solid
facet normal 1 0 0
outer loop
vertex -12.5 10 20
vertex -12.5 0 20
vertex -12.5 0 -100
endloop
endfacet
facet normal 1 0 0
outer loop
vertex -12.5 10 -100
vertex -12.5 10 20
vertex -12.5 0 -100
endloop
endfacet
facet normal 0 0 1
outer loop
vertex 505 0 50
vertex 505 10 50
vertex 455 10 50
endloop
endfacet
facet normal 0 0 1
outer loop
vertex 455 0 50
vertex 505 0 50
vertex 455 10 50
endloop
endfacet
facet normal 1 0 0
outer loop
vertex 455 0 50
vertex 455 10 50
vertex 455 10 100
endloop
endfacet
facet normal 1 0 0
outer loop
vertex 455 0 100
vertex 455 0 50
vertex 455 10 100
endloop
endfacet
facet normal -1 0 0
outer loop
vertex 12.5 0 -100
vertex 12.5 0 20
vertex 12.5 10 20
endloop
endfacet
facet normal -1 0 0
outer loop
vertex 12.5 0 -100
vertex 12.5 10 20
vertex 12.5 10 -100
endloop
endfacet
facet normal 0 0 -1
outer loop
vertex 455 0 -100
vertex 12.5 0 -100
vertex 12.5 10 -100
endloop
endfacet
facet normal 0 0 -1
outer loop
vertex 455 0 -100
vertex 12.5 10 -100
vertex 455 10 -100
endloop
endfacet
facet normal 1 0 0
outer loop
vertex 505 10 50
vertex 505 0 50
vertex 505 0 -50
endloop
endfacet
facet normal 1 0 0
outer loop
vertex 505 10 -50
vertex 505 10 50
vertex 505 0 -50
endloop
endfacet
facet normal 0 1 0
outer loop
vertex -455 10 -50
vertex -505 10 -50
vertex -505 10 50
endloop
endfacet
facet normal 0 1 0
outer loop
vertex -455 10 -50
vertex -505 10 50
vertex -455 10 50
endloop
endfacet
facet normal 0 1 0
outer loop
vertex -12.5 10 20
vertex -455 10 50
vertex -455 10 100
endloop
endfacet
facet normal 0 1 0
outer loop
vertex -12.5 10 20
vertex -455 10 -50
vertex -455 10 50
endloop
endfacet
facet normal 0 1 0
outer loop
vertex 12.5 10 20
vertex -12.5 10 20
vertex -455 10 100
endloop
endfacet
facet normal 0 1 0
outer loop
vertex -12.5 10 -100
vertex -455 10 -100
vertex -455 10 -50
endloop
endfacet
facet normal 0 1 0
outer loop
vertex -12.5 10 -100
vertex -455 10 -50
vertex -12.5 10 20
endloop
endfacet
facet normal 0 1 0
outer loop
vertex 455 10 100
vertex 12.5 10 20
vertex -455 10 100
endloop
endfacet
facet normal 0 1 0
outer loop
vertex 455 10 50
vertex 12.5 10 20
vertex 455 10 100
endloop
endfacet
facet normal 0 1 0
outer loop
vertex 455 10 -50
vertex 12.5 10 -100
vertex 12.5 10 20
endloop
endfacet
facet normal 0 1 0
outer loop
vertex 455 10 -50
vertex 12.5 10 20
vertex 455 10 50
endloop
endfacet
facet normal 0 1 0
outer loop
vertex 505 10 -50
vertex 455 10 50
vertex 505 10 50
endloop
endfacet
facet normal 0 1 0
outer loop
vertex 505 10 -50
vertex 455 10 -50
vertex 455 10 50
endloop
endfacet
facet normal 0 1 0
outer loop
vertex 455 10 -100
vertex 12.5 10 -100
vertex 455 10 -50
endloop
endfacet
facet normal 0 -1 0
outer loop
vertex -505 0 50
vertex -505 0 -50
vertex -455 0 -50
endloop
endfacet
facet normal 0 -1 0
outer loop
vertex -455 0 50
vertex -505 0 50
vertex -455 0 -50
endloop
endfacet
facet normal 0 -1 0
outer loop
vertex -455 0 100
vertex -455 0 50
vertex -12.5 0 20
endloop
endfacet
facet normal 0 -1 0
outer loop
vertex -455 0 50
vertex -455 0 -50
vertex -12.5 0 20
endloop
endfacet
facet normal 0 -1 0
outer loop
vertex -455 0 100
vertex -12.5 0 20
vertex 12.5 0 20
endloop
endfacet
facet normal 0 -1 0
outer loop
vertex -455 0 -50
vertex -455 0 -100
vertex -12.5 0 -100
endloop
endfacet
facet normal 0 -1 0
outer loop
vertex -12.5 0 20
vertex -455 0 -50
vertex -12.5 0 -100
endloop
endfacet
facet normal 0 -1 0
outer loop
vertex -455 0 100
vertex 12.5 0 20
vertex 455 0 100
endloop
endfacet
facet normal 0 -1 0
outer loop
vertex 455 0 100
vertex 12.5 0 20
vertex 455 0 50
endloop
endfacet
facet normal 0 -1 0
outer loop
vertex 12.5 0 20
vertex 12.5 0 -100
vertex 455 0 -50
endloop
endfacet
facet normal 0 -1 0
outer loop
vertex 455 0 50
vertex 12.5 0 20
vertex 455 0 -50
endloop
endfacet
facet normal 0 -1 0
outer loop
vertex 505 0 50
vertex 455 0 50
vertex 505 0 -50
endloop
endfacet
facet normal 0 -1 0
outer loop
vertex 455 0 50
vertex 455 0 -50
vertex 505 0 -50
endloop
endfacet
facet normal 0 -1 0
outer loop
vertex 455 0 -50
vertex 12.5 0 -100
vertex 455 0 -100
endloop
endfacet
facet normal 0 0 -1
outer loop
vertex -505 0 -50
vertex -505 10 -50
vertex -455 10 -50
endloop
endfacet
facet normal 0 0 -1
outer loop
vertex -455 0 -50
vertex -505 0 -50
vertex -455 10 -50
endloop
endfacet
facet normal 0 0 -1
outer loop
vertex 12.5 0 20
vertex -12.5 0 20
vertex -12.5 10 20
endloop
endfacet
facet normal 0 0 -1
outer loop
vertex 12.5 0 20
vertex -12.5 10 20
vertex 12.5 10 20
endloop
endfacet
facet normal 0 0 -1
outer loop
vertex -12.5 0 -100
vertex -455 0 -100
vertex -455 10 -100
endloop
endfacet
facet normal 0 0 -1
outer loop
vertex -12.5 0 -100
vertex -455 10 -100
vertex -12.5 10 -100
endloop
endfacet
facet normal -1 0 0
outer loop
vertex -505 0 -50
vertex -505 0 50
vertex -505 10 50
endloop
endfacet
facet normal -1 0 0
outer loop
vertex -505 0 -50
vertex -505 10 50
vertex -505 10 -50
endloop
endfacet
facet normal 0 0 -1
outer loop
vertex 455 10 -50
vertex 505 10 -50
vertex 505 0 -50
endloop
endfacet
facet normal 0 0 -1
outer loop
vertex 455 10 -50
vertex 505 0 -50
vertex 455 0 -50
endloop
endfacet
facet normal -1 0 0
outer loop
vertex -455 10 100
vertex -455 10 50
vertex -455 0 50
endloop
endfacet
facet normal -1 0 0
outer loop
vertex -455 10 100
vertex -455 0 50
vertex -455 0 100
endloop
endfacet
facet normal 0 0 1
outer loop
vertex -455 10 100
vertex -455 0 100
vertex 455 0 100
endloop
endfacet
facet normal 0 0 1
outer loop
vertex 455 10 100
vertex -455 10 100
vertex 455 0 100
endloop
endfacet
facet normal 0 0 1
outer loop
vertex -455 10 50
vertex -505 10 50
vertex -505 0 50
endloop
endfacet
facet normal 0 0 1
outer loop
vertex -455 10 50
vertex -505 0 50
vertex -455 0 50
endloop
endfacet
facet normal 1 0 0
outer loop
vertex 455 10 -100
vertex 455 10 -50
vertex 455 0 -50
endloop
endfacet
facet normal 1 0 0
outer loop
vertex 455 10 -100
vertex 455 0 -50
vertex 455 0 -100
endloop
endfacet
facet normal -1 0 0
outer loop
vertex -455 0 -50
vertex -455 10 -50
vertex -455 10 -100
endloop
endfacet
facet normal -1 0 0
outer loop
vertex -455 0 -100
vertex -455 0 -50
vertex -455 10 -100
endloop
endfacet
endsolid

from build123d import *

# Parameters (mm, degrees)
SKETCH1_W               = 1010
SKETCH1_H               = 200
BOSS_EXTRUDE1_DEPTH     = 10
SKETCH2_W               = 50
SKETCH2_H               = 50
CUT_EXTRUDE1_DEPTH      = 10
MIRROR2_COPY_1_SKETCH_W = 50
MIRROR2_COPY_1_SKETCH_H = 50
MIRROR2_COPY_1_DEPTH    = 10
SKETCH3_W               = 25
SKETCH3_H               = 120
CUT_EXTRUDE3_DEPTH      = 10


with BuildPart() as part:
    # Sketch1 → Boss-Extrude1 (new body)
    with BuildSketch(Plane(origin=(0, 0, 0), x_dir=(1, 0, 0), z_dir=(0, 1, 0))):
        Rectangle(SKETCH1_W, SKETCH1_H)
    extrude(amount=BOSS_EXTRUDE1_DEPTH)

    # Sketch2 → Cut-Extrude1 (cut)
    with BuildSketch(Plane(origin=(0, 10, 0), x_dir=(1, 0, 0), z_dir=(0, 1, 0))):
        with Locations((-480, 75)):
            Rectangle(SKETCH2_W, SKETCH2_H)
    cut_extrude1 = extrude(amount=-CUT_EXTRUDE1_DEPTH, mode=Mode.SUBTRACT)

    # Mirror1: Cut-Extrude1 across plane
    add(cut_extrude1.mirror(Plane.XY), mode=Mode.SUBTRACT)

    # Mirror2: Cut-Extrude1 across plane
    add(cut_extrude1.mirror(Plane(origin=(0, 0, 0), x_dir=(0, 0, 1), z_dir=(1, 0, 0))), mode=Mode.SUBTRACT)

    # Mirror2 copy 1 sketch → Mirror2 copy 1 (cut)
    with BuildSketch(Plane(origin=(0, 10, 0), x_dir=(-1, 0, 0), z_dir=(0, 1, 0))):
        with Locations((-480, 75)):
            Rectangle(MIRROR2_COPY_1_SKETCH_W, MIRROR2_COPY_1_SKETCH_H)
    extrude(amount=-MIRROR2_COPY_1_DEPTH, mode=Mode.SUBTRACT)

    # Sketch3 → Cut-Extrude3 (cut)
    with BuildSketch(Plane(origin=(0, 0, 0), x_dir=(1, 0, 0), z_dir=(0, 1, 0))):
        with Locations((0, 40)):
            Rectangle(SKETCH3_W, SKETCH3_H)
    extrude(amount=CUT_EXTRUDE3_DEPTH, mode=Mode.SUBTRACT)


solid = part.part
